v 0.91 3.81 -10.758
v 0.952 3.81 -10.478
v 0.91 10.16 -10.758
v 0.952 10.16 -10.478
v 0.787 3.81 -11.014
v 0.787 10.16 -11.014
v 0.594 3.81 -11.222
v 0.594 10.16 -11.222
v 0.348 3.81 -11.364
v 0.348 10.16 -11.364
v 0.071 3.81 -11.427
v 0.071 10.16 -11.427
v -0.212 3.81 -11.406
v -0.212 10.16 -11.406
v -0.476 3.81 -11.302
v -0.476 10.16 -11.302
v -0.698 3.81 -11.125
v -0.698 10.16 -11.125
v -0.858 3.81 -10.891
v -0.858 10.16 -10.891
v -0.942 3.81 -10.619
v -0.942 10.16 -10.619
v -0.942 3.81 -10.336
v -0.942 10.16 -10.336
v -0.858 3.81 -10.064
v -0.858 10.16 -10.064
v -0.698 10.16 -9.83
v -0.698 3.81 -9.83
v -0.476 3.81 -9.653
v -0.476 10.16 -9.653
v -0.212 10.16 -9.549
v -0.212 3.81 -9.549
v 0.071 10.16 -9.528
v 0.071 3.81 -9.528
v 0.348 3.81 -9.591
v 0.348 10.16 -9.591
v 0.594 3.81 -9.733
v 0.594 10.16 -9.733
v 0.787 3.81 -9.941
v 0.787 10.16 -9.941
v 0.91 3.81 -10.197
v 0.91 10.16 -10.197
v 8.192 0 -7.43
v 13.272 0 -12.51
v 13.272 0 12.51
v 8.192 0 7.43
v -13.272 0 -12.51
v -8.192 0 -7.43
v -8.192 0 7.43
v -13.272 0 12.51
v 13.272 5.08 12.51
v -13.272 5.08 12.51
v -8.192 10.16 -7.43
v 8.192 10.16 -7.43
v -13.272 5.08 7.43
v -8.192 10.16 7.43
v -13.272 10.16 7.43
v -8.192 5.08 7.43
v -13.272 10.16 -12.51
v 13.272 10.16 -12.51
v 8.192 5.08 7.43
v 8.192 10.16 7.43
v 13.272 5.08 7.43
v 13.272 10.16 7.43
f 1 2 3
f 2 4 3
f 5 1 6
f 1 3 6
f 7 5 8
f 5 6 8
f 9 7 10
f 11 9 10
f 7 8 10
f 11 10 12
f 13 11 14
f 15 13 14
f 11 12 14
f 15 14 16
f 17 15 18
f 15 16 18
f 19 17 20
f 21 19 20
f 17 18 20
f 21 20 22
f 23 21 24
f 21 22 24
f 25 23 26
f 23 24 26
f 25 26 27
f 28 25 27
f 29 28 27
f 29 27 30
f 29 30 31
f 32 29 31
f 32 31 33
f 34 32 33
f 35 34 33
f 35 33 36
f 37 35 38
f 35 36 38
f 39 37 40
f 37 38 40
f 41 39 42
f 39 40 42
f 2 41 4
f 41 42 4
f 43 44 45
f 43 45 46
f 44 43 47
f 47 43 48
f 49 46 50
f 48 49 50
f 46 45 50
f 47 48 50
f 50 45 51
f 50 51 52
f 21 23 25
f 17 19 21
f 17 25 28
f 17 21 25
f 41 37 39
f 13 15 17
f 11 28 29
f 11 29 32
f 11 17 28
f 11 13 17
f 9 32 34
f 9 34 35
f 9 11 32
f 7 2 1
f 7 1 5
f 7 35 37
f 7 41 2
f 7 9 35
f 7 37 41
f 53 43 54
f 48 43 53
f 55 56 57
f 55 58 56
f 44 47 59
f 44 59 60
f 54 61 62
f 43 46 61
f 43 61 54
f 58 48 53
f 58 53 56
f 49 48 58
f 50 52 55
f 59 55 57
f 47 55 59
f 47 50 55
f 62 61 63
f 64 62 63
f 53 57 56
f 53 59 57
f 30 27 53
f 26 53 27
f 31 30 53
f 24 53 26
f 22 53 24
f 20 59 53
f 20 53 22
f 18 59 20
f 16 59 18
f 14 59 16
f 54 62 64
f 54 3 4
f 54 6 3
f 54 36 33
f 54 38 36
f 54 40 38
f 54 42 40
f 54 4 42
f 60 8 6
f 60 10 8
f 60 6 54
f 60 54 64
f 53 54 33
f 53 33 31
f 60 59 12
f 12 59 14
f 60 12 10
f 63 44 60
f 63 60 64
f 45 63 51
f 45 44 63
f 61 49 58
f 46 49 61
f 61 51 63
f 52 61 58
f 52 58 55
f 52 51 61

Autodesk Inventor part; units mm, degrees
ref_plane "YZ Plane" through (0, 0, 0) normal (1, 0, 0) x (0, 1, 0)
ref_plane "XZ Plane" through (0, 0, 0) normal (0, 1, 0) x (-1, 0, 0)
ref_plane "XY Plane" through (0, 0, 0) normal (0, 0, 1) x (1, 0, 0)
sketch "Sketch1" plane through (0, 0, 0) normal (0, 1, 0) x (-1, 0, 0)
  line L0 (8.1915, 7.4295) -> (-8.1915, 7.4295)
  line L1 (-8.1915, 7.4295) -> (-8.1915, -7.4295)
  line L2 (-8.1915, -7.4295) -> (8.1915, -7.4295)
  line L3 (8.1915, -7.4295) -> (8.1915, 7.4295)
  line L4 (13.2715, -12.5095) -> (-13.2715, -12.5095)
  line L5 (-13.2715, -12.5095) -> (-13.2715, 12.5095)
  line L6 (-13.2715, 12.5095) -> (13.2715, 12.5095)
  line L7 (13.2715, 12.5095) -> (13.2715, -12.5095)
  point P0 (0, 0)
  point P1 (0, -7.4295)
  point P2 (8.1915, 0)
  dimension "d0" = 16.383
  dimension "d1" = 14.859
  dimension "d2" = 5.08
extrude "Extrusion1" add sketch "Sketch1" along normal blind 5.08
sketch "Sketch2" plane through (0, 5.08, 0) normal (0, 1, 0) x (1, 0, 0)
  line L0 (-13.2715, -12.5095) -> (13.2715, -12.5095) projected
  line L1 (13.2715, -12.5095) -> (13.2715, 12.5095) projected
  line L2 (13.2715, 12.5095) -> (-13.2715, 12.5095) projected
  line L3 (-13.2715, 12.5095) -> (-13.2715, -12.5095) projected
  line L4 (-8.1915, -7.4295) -> (-8.1915, 7.4295) projected
  line L5 (-8.1915, 7.4295) -> (8.1915, 7.4295) projected
  line L6 (8.1915, 7.4295) -> (8.1915, -7.4295) projected
  line L7 (8.1915, -7.4295) -> (-8.1915, -7.4295) projected
  line L8 (-8.1915, -7.4295) -> (-13.2715, -7.4295)
  line L9 (8.1915, -7.4295) -> (-8.1915, -7.4295) projected
  line L10 (8.1915, -7.4295) -> (13.2715, -7.4295)
  point P0 (0, 0)
extrude "Extrusion2" add sketch "Sketch2" along normal blind 5.08 contours L3 L2 L1 L10 L6 L5 L4 L8
sketch "Sketch3" plane through (0, 10.16, 0) normal (0, 1, 0) x (1, 0, 0)
  line L0 (-8.1915, 7.4295) -> (8.1915, 7.4295) projected
  line L1 (-3.81, 7.4295) -> (3.81, 7.4295) construction
  line L2 (3.81, 7.4295) -> (3.81, 9.7155) construction
  line L3 (3.81, 9.7155) -> (-3.81, 9.7155) construction
  line L4 (-3.81, 9.7155) -> (-3.81, 7.4295) construction
  circle A0 centre (0, 10.4775) radius 1.143 construction
  circle A1 centre (0, 10.4775) radius 0.9525
  point P0 (0, 0)
  point P1 (0, 9.7155)
  point P2 (0, 7.4295)
  point P3 (0, 7.4295)
  dimension "d7" = 7.62
  dimension "d8" = 2.286
  dimension "d9" = 2.286
  dimension "d10" = 1.905
  dimension "d14" = 0.762
extrude "Extrusion3" cut sketch "Sketch3" against normal blind 6.35
properties part number "RJ45Adapter"
